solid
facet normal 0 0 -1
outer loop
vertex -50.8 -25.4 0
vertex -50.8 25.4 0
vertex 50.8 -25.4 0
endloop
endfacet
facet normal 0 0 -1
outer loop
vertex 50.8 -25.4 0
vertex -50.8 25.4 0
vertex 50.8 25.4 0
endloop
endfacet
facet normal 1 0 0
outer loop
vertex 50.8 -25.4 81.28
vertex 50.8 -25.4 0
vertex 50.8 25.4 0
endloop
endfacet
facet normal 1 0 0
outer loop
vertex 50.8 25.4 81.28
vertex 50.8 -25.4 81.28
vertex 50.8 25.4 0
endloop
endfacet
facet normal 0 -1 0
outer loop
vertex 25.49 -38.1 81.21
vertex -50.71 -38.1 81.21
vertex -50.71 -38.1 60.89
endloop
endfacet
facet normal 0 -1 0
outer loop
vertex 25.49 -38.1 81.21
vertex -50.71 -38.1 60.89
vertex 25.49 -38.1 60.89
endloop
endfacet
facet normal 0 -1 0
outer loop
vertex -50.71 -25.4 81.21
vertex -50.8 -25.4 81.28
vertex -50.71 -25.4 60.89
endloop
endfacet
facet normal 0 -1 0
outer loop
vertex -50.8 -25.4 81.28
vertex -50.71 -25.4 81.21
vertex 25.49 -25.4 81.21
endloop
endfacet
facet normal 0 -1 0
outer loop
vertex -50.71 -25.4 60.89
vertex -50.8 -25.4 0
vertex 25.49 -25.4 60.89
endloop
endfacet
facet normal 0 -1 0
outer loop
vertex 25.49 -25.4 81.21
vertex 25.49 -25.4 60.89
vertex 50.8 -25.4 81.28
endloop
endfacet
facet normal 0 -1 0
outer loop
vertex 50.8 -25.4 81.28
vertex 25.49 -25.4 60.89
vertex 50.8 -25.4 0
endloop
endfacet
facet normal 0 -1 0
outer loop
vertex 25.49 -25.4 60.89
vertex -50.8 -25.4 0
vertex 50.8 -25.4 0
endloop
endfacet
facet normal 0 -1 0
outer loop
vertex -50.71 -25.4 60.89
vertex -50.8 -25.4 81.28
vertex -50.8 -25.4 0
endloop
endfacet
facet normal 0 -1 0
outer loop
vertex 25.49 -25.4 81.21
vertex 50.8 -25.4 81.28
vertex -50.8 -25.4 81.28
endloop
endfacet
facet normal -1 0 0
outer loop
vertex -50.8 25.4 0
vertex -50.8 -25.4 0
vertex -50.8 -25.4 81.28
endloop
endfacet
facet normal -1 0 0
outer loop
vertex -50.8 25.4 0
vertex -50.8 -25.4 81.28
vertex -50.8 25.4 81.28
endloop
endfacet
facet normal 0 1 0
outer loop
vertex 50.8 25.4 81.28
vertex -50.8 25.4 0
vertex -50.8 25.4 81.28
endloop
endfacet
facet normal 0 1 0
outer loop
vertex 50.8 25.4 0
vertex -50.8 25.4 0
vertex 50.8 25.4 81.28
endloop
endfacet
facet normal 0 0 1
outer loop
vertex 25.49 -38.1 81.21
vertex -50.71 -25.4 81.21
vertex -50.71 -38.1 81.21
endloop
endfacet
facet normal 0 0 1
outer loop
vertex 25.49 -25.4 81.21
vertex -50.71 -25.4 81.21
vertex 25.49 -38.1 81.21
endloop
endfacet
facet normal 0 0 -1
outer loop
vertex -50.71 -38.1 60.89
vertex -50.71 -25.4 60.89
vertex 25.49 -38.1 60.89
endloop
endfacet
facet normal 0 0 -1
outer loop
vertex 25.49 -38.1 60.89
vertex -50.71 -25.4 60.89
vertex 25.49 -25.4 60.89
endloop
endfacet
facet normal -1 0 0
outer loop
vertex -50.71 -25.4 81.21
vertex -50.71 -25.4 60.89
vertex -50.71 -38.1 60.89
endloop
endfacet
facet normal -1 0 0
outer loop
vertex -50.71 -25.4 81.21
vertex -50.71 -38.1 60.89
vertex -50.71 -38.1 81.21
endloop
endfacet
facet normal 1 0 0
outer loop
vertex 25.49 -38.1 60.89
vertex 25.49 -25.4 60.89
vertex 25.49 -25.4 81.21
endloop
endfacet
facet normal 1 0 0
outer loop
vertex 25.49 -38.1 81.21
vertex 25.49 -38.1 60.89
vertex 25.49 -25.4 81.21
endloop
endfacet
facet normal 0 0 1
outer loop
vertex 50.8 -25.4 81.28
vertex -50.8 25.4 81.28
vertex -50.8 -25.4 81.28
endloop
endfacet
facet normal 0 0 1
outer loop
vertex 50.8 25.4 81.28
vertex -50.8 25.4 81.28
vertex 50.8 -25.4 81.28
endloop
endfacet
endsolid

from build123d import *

# Parameters (mm, degrees)
F0_W     = 101.6
F0_H     = 50.8
F1_DEPTH = 81.28
F3_W     = 76.2
F3_H     = 20.32
F4_DEPTH = 12.7


with BuildPart() as f1:
    # F0 (on Top) → F1 (new body)
    with BuildSketch(Plane.XY):
        Rectangle(F0_W, F0_H)
    extrude(amount=F1_DEPTH)

    # F3 (on offset) → F4 (join)
    with BuildSketch(Plane.XZ.offset(25.4)):
        with Locations((-12.610486, 71.049867)):
            Rectangle(F3_W, F3_H)
    extrude(amount=F4_DEPTH)


solid = f1.part
